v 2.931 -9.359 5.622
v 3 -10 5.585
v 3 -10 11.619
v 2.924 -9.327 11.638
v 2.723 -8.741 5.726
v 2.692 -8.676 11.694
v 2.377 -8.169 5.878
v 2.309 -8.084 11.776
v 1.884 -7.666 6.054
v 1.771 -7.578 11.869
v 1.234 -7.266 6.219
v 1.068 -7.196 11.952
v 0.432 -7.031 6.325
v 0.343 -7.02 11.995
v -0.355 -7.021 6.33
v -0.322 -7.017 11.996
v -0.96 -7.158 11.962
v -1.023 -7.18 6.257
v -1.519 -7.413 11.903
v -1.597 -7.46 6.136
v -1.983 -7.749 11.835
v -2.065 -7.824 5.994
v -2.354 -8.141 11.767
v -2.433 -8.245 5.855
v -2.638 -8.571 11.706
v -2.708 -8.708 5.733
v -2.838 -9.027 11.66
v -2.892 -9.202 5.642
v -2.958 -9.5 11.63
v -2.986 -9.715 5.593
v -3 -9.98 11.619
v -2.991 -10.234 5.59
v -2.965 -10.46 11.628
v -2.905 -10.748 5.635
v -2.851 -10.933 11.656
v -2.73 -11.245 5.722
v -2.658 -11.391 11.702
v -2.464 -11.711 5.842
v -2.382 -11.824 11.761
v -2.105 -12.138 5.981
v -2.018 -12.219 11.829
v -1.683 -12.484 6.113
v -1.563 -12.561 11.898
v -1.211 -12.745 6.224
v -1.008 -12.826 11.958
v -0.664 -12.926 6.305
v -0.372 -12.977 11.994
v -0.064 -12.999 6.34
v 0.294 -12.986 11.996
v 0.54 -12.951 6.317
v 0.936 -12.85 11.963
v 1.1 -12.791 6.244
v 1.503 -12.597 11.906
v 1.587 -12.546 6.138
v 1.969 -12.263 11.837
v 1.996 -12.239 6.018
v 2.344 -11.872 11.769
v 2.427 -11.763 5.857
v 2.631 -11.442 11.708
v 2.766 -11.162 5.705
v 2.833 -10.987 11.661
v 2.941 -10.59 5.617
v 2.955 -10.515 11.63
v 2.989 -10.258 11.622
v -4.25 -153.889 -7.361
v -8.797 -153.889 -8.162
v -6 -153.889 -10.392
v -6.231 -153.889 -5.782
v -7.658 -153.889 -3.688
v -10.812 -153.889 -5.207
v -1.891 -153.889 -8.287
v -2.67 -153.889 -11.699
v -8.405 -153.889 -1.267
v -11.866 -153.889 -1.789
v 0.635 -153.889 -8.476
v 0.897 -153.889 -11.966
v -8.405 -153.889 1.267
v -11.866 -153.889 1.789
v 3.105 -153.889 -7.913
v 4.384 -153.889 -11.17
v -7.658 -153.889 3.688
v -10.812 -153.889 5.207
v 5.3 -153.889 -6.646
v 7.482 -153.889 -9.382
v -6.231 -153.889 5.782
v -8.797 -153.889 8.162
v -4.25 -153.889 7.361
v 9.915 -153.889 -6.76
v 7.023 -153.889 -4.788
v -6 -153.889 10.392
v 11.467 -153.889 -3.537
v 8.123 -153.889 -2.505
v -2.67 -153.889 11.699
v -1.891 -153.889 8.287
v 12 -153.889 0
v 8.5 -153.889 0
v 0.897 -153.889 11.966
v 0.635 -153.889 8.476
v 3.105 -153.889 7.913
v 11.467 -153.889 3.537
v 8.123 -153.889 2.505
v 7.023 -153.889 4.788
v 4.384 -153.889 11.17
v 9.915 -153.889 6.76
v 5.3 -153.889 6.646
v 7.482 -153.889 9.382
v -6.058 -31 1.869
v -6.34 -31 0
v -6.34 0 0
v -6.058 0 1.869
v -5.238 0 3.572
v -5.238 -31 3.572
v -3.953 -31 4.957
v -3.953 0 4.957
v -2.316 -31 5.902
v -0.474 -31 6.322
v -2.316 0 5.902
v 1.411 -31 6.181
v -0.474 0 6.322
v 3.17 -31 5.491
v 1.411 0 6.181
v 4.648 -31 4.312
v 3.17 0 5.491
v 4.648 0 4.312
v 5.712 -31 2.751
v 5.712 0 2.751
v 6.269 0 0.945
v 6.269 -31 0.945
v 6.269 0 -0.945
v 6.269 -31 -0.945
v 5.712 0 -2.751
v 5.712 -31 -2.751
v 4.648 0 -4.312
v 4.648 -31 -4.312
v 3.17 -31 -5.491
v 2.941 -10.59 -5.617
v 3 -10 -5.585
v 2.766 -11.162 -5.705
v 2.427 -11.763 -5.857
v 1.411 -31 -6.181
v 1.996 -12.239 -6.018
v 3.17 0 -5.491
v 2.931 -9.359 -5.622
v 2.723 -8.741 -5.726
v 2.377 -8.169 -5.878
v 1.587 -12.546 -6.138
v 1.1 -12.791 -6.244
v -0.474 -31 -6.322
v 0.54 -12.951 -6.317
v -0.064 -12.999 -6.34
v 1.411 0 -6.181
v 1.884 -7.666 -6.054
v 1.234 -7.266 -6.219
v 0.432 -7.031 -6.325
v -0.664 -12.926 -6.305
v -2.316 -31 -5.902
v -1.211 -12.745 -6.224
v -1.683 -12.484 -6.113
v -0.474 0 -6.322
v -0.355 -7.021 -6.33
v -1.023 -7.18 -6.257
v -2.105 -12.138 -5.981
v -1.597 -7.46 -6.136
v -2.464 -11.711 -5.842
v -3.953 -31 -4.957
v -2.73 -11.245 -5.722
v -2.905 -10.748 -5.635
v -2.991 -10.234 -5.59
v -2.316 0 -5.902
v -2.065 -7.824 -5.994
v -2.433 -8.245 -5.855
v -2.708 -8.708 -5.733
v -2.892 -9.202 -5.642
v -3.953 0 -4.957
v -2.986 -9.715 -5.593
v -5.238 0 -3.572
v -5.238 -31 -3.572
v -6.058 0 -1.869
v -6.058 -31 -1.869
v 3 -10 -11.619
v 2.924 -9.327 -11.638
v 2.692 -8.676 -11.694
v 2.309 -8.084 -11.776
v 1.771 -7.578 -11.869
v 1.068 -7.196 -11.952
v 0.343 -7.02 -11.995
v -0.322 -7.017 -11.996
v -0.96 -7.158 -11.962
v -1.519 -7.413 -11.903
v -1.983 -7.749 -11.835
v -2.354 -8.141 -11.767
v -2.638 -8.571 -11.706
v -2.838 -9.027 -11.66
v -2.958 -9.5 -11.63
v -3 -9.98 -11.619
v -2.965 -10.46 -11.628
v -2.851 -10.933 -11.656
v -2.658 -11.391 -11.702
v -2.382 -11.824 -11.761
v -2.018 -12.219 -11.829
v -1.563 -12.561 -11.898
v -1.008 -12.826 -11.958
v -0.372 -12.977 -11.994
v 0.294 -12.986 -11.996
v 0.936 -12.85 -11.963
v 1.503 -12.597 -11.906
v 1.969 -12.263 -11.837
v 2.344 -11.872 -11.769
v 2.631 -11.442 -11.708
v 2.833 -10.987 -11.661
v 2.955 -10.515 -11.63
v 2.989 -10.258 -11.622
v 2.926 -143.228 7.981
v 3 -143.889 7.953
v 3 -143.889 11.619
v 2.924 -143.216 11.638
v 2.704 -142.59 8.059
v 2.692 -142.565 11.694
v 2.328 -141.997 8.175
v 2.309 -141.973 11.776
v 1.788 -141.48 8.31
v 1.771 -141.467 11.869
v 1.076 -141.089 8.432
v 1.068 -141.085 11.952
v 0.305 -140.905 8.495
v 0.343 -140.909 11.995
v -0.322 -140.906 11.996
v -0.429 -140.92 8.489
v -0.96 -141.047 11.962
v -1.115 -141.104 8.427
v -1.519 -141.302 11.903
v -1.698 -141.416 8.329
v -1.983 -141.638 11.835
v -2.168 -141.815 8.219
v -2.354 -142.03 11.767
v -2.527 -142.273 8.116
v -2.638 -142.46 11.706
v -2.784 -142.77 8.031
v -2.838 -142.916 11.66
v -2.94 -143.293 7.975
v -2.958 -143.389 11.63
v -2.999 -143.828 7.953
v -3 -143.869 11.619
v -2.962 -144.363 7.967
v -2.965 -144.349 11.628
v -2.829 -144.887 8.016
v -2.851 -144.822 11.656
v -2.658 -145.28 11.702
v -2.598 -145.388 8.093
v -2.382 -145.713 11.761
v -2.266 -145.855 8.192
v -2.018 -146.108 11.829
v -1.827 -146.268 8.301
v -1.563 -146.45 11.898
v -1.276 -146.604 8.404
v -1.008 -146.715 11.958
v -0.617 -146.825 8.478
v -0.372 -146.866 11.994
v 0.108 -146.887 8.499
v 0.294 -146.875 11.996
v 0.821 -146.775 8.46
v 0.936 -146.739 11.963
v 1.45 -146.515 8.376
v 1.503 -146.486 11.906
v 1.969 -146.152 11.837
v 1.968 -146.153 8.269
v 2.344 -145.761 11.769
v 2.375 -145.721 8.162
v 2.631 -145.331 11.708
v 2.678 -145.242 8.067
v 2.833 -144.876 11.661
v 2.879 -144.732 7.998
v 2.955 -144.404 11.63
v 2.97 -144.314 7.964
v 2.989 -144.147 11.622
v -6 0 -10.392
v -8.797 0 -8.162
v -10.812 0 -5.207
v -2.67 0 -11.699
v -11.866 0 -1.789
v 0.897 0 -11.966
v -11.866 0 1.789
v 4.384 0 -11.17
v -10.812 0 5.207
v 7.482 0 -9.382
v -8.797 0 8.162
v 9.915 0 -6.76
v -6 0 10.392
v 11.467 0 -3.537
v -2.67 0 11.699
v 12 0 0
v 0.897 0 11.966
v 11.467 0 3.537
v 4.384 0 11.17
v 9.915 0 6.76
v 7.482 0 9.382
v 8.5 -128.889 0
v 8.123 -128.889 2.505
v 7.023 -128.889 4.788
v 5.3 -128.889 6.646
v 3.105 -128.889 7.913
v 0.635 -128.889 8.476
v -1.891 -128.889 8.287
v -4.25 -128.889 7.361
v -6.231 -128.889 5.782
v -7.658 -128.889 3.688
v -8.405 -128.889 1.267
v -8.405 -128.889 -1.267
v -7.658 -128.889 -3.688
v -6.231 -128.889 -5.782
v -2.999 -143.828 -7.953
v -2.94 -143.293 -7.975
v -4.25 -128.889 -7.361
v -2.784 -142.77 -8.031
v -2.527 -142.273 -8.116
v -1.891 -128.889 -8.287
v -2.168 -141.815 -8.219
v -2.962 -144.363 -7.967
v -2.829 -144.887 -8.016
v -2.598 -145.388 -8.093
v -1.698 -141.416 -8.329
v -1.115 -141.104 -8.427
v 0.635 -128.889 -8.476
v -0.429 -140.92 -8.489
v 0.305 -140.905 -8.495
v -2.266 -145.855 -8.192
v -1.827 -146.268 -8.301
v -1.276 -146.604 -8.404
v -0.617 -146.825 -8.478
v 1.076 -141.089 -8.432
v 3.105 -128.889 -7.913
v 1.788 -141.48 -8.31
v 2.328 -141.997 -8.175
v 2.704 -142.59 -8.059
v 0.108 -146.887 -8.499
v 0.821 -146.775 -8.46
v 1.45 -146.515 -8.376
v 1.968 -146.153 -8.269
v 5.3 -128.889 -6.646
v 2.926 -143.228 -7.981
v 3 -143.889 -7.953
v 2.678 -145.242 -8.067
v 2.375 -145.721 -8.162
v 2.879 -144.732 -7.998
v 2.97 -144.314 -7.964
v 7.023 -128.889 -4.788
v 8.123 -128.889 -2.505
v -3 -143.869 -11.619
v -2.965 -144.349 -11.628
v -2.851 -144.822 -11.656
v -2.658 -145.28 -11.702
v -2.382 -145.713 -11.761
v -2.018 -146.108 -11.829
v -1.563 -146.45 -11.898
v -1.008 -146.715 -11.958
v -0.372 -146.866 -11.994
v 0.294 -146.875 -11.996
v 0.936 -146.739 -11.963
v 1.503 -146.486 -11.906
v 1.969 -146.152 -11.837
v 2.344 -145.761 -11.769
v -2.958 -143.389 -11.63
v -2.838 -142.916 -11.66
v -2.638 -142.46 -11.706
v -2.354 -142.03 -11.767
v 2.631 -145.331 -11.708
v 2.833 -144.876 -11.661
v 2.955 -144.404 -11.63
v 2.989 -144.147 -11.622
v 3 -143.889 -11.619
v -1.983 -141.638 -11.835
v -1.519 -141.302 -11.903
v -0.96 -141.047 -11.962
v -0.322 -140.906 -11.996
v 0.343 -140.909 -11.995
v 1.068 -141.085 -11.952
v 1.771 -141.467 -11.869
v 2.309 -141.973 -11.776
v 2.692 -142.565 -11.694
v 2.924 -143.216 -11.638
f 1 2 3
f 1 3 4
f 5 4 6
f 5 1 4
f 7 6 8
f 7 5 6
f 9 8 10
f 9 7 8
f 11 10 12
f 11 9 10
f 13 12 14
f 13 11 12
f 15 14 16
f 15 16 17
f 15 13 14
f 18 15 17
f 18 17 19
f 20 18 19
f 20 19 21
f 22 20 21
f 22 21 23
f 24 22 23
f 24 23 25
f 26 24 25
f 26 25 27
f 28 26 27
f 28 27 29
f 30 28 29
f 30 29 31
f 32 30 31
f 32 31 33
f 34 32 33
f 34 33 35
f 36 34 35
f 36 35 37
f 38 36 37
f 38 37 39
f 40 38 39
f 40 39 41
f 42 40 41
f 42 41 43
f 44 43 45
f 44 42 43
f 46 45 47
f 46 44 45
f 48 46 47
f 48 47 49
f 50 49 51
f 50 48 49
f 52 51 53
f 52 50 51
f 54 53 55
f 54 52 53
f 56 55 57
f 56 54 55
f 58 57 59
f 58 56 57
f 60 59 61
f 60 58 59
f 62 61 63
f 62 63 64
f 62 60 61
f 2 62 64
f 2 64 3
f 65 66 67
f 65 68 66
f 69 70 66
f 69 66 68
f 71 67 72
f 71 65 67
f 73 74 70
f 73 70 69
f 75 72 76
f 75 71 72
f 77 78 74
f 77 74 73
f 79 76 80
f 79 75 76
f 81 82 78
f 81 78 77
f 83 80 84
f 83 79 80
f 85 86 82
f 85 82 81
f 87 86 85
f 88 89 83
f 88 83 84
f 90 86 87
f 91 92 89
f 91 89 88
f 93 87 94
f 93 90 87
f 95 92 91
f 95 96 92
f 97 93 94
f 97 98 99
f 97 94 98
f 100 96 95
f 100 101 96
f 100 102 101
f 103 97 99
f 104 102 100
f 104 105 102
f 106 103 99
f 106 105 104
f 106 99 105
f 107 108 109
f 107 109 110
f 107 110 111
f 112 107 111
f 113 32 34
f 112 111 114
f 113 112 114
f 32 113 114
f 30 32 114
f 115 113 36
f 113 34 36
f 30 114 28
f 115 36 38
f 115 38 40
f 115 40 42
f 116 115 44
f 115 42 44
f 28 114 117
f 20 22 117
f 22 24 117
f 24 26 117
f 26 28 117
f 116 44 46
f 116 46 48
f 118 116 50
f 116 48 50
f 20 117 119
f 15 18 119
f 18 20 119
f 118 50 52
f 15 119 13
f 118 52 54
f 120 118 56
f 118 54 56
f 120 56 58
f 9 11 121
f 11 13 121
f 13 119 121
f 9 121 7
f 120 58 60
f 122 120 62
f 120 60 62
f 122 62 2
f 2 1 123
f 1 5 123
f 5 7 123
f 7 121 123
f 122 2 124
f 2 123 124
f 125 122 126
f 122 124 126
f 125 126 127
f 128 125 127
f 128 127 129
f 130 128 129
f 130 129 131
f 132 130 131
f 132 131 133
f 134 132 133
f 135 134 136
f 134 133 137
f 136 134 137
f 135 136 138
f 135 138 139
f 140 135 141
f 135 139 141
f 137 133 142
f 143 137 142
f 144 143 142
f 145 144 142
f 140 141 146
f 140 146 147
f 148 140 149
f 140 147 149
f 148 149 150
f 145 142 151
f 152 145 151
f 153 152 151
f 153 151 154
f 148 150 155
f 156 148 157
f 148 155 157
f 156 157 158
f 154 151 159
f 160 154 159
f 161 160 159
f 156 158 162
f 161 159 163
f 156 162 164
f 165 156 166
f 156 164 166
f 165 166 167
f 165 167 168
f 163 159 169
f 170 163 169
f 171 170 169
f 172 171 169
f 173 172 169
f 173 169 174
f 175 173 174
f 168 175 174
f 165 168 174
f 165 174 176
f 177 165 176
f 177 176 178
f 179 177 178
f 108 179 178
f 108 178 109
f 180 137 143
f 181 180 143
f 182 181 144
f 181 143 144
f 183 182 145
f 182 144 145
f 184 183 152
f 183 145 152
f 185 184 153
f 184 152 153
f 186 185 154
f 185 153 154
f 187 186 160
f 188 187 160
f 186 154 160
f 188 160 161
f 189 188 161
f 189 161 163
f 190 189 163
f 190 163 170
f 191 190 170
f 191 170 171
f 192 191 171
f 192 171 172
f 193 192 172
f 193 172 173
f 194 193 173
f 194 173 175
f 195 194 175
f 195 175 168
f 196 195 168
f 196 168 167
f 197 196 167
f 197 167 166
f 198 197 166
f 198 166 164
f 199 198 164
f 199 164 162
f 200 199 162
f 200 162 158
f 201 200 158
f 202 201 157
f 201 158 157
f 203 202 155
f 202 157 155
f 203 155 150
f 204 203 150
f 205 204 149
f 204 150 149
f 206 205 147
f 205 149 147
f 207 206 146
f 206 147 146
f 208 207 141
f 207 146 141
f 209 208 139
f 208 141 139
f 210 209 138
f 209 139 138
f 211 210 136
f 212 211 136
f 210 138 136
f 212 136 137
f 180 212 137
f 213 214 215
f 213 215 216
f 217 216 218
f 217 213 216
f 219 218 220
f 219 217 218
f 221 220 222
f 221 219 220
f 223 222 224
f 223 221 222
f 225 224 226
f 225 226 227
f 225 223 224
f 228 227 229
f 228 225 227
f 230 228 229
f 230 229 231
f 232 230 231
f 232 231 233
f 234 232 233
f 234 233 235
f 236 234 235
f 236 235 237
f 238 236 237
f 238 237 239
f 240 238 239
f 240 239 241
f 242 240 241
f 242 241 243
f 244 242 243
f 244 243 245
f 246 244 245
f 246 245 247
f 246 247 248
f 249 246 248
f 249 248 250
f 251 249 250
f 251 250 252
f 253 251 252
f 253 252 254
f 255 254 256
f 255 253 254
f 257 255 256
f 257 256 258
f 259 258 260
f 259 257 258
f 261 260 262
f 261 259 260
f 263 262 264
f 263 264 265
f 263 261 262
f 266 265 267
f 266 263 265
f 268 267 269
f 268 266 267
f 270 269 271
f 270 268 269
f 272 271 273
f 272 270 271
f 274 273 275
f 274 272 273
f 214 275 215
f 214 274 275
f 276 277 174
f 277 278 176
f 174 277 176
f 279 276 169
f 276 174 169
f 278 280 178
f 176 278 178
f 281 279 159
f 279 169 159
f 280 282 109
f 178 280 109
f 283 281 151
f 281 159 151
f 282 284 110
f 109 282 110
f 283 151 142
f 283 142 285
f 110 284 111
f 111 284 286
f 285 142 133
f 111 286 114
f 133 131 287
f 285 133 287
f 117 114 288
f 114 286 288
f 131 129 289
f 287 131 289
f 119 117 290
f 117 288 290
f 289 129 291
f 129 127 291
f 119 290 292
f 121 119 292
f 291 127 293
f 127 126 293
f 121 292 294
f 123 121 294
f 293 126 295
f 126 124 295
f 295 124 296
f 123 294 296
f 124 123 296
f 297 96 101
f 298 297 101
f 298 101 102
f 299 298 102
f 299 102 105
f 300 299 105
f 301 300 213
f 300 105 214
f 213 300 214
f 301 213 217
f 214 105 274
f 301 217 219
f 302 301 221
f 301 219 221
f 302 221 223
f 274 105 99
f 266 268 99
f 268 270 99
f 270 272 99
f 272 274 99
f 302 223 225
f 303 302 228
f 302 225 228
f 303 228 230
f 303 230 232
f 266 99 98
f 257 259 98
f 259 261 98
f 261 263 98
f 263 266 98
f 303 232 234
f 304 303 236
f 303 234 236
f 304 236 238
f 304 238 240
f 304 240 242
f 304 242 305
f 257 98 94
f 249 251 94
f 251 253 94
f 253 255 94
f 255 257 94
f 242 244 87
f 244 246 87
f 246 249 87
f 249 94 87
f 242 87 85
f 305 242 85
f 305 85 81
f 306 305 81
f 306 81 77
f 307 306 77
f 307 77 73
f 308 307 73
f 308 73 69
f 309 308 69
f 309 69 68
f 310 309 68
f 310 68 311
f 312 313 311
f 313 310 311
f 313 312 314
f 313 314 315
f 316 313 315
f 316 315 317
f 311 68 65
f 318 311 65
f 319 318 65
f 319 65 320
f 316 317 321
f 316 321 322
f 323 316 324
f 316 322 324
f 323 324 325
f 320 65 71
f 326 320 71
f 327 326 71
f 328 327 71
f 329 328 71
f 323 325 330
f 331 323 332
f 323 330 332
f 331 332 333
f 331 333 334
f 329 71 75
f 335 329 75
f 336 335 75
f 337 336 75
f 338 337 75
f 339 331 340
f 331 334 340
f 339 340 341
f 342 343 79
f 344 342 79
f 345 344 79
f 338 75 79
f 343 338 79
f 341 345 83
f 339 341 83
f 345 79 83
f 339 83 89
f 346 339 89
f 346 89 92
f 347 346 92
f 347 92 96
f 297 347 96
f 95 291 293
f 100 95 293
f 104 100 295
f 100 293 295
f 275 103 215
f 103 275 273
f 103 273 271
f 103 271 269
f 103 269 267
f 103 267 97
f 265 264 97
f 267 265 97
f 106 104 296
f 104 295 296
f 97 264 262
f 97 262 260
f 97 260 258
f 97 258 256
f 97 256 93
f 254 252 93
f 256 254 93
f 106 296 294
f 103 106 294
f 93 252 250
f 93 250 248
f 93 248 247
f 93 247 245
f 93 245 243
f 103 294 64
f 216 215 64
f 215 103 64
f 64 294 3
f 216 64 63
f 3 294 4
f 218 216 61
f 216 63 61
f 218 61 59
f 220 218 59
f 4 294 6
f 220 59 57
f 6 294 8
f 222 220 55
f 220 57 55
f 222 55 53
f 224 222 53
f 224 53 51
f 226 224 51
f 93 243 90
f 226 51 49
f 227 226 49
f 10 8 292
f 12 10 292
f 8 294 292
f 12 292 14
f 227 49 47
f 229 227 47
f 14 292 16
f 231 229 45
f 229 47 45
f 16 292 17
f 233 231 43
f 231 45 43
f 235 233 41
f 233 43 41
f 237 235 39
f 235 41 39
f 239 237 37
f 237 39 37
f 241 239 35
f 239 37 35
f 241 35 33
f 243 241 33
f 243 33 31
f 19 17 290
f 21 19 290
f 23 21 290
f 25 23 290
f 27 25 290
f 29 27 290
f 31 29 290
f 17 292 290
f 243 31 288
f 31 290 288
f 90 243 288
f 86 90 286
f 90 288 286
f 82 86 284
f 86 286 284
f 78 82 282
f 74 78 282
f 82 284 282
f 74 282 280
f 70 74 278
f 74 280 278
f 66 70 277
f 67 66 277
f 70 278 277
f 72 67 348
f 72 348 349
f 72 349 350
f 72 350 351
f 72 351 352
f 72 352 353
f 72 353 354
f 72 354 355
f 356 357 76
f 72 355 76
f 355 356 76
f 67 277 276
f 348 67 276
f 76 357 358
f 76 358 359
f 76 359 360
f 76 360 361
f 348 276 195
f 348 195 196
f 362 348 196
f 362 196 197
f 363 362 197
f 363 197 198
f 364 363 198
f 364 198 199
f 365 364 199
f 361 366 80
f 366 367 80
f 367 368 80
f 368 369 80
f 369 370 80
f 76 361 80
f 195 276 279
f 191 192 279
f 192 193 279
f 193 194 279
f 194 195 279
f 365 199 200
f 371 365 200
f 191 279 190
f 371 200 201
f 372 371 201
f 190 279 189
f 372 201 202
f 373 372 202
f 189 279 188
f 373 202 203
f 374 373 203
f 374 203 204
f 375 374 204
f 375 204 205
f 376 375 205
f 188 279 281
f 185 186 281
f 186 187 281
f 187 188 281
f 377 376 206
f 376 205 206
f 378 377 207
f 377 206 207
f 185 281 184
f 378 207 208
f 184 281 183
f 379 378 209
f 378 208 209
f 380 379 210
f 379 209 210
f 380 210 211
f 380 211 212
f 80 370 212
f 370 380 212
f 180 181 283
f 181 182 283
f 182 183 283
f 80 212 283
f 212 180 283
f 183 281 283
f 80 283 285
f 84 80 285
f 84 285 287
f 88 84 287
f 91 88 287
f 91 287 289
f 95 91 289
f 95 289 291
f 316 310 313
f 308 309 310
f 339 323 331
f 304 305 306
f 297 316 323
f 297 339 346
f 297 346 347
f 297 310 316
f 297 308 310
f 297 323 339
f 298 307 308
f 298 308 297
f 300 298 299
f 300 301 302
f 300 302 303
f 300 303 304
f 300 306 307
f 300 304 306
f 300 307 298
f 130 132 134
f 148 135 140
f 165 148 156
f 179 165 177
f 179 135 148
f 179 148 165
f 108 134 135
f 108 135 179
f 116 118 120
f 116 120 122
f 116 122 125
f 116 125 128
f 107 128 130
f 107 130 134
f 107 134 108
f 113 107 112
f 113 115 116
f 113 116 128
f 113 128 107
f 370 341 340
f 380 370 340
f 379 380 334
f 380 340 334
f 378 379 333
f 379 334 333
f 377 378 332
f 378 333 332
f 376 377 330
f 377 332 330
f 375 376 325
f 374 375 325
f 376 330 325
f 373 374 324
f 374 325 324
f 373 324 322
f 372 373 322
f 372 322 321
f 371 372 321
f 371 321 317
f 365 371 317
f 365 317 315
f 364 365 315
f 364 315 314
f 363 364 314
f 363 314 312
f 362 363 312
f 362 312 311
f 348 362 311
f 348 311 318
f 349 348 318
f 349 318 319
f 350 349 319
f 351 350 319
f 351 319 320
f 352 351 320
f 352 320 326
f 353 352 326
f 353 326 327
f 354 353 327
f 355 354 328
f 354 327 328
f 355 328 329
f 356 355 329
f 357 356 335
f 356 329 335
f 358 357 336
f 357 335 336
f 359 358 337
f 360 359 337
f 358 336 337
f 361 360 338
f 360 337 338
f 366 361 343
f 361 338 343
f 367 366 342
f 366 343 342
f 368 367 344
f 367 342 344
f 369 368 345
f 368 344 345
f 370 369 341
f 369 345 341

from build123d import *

# Parameters (mm, degrees)
F0_R          = 12
F1_DEPTH      = 153.889
F2_R          = 8.50015
F3_DEPTH      = 25
F4_R          = 6.34015
F5_DEPTH      = 31
F6_R          = 3
F7_DEPTH      = 25
F7_DEPTH_BACK = 25


with BuildPart() as f1:
    # F0 (on Front) → F1 (new body)
    with BuildSketch(Plane.XZ):
        Circle(F0_R)
    extrude(amount=F1_DEPTH)

    # F2 (on face) → F3 (cut)
    with BuildSketch(Plane.XZ.offset(153.889)):
        Circle(F2_R)
    extrude(amount=-F3_DEPTH, mode=Mode.SUBTRACT)

    # F4 (on face) → F5 (cut)
    with BuildSketch(Plane(origin=(0, 0, 0), x_dir=(-1, 0, 0), z_dir=(0, 1, 0))):
        Circle(F4_R)
    extrude(amount=-F5_DEPTH, mode=Mode.SUBTRACT)

    # F6 (on Top) → F7 (cut, two sides)
    with BuildSketch(Plane.XY) as f7_sk:
        with Locations((0, -10)):
            Circle(F6_R)
        with Locations((0, -143.889)):
            Circle(F6_R)
    extrude(amount=-F7_DEPTH, mode=Mode.SUBTRACT)
    extrude(f7_sk.sketch, amount=F7_DEPTH_BACK, mode=Mode.SUBTRACT)


solid = f1.part
